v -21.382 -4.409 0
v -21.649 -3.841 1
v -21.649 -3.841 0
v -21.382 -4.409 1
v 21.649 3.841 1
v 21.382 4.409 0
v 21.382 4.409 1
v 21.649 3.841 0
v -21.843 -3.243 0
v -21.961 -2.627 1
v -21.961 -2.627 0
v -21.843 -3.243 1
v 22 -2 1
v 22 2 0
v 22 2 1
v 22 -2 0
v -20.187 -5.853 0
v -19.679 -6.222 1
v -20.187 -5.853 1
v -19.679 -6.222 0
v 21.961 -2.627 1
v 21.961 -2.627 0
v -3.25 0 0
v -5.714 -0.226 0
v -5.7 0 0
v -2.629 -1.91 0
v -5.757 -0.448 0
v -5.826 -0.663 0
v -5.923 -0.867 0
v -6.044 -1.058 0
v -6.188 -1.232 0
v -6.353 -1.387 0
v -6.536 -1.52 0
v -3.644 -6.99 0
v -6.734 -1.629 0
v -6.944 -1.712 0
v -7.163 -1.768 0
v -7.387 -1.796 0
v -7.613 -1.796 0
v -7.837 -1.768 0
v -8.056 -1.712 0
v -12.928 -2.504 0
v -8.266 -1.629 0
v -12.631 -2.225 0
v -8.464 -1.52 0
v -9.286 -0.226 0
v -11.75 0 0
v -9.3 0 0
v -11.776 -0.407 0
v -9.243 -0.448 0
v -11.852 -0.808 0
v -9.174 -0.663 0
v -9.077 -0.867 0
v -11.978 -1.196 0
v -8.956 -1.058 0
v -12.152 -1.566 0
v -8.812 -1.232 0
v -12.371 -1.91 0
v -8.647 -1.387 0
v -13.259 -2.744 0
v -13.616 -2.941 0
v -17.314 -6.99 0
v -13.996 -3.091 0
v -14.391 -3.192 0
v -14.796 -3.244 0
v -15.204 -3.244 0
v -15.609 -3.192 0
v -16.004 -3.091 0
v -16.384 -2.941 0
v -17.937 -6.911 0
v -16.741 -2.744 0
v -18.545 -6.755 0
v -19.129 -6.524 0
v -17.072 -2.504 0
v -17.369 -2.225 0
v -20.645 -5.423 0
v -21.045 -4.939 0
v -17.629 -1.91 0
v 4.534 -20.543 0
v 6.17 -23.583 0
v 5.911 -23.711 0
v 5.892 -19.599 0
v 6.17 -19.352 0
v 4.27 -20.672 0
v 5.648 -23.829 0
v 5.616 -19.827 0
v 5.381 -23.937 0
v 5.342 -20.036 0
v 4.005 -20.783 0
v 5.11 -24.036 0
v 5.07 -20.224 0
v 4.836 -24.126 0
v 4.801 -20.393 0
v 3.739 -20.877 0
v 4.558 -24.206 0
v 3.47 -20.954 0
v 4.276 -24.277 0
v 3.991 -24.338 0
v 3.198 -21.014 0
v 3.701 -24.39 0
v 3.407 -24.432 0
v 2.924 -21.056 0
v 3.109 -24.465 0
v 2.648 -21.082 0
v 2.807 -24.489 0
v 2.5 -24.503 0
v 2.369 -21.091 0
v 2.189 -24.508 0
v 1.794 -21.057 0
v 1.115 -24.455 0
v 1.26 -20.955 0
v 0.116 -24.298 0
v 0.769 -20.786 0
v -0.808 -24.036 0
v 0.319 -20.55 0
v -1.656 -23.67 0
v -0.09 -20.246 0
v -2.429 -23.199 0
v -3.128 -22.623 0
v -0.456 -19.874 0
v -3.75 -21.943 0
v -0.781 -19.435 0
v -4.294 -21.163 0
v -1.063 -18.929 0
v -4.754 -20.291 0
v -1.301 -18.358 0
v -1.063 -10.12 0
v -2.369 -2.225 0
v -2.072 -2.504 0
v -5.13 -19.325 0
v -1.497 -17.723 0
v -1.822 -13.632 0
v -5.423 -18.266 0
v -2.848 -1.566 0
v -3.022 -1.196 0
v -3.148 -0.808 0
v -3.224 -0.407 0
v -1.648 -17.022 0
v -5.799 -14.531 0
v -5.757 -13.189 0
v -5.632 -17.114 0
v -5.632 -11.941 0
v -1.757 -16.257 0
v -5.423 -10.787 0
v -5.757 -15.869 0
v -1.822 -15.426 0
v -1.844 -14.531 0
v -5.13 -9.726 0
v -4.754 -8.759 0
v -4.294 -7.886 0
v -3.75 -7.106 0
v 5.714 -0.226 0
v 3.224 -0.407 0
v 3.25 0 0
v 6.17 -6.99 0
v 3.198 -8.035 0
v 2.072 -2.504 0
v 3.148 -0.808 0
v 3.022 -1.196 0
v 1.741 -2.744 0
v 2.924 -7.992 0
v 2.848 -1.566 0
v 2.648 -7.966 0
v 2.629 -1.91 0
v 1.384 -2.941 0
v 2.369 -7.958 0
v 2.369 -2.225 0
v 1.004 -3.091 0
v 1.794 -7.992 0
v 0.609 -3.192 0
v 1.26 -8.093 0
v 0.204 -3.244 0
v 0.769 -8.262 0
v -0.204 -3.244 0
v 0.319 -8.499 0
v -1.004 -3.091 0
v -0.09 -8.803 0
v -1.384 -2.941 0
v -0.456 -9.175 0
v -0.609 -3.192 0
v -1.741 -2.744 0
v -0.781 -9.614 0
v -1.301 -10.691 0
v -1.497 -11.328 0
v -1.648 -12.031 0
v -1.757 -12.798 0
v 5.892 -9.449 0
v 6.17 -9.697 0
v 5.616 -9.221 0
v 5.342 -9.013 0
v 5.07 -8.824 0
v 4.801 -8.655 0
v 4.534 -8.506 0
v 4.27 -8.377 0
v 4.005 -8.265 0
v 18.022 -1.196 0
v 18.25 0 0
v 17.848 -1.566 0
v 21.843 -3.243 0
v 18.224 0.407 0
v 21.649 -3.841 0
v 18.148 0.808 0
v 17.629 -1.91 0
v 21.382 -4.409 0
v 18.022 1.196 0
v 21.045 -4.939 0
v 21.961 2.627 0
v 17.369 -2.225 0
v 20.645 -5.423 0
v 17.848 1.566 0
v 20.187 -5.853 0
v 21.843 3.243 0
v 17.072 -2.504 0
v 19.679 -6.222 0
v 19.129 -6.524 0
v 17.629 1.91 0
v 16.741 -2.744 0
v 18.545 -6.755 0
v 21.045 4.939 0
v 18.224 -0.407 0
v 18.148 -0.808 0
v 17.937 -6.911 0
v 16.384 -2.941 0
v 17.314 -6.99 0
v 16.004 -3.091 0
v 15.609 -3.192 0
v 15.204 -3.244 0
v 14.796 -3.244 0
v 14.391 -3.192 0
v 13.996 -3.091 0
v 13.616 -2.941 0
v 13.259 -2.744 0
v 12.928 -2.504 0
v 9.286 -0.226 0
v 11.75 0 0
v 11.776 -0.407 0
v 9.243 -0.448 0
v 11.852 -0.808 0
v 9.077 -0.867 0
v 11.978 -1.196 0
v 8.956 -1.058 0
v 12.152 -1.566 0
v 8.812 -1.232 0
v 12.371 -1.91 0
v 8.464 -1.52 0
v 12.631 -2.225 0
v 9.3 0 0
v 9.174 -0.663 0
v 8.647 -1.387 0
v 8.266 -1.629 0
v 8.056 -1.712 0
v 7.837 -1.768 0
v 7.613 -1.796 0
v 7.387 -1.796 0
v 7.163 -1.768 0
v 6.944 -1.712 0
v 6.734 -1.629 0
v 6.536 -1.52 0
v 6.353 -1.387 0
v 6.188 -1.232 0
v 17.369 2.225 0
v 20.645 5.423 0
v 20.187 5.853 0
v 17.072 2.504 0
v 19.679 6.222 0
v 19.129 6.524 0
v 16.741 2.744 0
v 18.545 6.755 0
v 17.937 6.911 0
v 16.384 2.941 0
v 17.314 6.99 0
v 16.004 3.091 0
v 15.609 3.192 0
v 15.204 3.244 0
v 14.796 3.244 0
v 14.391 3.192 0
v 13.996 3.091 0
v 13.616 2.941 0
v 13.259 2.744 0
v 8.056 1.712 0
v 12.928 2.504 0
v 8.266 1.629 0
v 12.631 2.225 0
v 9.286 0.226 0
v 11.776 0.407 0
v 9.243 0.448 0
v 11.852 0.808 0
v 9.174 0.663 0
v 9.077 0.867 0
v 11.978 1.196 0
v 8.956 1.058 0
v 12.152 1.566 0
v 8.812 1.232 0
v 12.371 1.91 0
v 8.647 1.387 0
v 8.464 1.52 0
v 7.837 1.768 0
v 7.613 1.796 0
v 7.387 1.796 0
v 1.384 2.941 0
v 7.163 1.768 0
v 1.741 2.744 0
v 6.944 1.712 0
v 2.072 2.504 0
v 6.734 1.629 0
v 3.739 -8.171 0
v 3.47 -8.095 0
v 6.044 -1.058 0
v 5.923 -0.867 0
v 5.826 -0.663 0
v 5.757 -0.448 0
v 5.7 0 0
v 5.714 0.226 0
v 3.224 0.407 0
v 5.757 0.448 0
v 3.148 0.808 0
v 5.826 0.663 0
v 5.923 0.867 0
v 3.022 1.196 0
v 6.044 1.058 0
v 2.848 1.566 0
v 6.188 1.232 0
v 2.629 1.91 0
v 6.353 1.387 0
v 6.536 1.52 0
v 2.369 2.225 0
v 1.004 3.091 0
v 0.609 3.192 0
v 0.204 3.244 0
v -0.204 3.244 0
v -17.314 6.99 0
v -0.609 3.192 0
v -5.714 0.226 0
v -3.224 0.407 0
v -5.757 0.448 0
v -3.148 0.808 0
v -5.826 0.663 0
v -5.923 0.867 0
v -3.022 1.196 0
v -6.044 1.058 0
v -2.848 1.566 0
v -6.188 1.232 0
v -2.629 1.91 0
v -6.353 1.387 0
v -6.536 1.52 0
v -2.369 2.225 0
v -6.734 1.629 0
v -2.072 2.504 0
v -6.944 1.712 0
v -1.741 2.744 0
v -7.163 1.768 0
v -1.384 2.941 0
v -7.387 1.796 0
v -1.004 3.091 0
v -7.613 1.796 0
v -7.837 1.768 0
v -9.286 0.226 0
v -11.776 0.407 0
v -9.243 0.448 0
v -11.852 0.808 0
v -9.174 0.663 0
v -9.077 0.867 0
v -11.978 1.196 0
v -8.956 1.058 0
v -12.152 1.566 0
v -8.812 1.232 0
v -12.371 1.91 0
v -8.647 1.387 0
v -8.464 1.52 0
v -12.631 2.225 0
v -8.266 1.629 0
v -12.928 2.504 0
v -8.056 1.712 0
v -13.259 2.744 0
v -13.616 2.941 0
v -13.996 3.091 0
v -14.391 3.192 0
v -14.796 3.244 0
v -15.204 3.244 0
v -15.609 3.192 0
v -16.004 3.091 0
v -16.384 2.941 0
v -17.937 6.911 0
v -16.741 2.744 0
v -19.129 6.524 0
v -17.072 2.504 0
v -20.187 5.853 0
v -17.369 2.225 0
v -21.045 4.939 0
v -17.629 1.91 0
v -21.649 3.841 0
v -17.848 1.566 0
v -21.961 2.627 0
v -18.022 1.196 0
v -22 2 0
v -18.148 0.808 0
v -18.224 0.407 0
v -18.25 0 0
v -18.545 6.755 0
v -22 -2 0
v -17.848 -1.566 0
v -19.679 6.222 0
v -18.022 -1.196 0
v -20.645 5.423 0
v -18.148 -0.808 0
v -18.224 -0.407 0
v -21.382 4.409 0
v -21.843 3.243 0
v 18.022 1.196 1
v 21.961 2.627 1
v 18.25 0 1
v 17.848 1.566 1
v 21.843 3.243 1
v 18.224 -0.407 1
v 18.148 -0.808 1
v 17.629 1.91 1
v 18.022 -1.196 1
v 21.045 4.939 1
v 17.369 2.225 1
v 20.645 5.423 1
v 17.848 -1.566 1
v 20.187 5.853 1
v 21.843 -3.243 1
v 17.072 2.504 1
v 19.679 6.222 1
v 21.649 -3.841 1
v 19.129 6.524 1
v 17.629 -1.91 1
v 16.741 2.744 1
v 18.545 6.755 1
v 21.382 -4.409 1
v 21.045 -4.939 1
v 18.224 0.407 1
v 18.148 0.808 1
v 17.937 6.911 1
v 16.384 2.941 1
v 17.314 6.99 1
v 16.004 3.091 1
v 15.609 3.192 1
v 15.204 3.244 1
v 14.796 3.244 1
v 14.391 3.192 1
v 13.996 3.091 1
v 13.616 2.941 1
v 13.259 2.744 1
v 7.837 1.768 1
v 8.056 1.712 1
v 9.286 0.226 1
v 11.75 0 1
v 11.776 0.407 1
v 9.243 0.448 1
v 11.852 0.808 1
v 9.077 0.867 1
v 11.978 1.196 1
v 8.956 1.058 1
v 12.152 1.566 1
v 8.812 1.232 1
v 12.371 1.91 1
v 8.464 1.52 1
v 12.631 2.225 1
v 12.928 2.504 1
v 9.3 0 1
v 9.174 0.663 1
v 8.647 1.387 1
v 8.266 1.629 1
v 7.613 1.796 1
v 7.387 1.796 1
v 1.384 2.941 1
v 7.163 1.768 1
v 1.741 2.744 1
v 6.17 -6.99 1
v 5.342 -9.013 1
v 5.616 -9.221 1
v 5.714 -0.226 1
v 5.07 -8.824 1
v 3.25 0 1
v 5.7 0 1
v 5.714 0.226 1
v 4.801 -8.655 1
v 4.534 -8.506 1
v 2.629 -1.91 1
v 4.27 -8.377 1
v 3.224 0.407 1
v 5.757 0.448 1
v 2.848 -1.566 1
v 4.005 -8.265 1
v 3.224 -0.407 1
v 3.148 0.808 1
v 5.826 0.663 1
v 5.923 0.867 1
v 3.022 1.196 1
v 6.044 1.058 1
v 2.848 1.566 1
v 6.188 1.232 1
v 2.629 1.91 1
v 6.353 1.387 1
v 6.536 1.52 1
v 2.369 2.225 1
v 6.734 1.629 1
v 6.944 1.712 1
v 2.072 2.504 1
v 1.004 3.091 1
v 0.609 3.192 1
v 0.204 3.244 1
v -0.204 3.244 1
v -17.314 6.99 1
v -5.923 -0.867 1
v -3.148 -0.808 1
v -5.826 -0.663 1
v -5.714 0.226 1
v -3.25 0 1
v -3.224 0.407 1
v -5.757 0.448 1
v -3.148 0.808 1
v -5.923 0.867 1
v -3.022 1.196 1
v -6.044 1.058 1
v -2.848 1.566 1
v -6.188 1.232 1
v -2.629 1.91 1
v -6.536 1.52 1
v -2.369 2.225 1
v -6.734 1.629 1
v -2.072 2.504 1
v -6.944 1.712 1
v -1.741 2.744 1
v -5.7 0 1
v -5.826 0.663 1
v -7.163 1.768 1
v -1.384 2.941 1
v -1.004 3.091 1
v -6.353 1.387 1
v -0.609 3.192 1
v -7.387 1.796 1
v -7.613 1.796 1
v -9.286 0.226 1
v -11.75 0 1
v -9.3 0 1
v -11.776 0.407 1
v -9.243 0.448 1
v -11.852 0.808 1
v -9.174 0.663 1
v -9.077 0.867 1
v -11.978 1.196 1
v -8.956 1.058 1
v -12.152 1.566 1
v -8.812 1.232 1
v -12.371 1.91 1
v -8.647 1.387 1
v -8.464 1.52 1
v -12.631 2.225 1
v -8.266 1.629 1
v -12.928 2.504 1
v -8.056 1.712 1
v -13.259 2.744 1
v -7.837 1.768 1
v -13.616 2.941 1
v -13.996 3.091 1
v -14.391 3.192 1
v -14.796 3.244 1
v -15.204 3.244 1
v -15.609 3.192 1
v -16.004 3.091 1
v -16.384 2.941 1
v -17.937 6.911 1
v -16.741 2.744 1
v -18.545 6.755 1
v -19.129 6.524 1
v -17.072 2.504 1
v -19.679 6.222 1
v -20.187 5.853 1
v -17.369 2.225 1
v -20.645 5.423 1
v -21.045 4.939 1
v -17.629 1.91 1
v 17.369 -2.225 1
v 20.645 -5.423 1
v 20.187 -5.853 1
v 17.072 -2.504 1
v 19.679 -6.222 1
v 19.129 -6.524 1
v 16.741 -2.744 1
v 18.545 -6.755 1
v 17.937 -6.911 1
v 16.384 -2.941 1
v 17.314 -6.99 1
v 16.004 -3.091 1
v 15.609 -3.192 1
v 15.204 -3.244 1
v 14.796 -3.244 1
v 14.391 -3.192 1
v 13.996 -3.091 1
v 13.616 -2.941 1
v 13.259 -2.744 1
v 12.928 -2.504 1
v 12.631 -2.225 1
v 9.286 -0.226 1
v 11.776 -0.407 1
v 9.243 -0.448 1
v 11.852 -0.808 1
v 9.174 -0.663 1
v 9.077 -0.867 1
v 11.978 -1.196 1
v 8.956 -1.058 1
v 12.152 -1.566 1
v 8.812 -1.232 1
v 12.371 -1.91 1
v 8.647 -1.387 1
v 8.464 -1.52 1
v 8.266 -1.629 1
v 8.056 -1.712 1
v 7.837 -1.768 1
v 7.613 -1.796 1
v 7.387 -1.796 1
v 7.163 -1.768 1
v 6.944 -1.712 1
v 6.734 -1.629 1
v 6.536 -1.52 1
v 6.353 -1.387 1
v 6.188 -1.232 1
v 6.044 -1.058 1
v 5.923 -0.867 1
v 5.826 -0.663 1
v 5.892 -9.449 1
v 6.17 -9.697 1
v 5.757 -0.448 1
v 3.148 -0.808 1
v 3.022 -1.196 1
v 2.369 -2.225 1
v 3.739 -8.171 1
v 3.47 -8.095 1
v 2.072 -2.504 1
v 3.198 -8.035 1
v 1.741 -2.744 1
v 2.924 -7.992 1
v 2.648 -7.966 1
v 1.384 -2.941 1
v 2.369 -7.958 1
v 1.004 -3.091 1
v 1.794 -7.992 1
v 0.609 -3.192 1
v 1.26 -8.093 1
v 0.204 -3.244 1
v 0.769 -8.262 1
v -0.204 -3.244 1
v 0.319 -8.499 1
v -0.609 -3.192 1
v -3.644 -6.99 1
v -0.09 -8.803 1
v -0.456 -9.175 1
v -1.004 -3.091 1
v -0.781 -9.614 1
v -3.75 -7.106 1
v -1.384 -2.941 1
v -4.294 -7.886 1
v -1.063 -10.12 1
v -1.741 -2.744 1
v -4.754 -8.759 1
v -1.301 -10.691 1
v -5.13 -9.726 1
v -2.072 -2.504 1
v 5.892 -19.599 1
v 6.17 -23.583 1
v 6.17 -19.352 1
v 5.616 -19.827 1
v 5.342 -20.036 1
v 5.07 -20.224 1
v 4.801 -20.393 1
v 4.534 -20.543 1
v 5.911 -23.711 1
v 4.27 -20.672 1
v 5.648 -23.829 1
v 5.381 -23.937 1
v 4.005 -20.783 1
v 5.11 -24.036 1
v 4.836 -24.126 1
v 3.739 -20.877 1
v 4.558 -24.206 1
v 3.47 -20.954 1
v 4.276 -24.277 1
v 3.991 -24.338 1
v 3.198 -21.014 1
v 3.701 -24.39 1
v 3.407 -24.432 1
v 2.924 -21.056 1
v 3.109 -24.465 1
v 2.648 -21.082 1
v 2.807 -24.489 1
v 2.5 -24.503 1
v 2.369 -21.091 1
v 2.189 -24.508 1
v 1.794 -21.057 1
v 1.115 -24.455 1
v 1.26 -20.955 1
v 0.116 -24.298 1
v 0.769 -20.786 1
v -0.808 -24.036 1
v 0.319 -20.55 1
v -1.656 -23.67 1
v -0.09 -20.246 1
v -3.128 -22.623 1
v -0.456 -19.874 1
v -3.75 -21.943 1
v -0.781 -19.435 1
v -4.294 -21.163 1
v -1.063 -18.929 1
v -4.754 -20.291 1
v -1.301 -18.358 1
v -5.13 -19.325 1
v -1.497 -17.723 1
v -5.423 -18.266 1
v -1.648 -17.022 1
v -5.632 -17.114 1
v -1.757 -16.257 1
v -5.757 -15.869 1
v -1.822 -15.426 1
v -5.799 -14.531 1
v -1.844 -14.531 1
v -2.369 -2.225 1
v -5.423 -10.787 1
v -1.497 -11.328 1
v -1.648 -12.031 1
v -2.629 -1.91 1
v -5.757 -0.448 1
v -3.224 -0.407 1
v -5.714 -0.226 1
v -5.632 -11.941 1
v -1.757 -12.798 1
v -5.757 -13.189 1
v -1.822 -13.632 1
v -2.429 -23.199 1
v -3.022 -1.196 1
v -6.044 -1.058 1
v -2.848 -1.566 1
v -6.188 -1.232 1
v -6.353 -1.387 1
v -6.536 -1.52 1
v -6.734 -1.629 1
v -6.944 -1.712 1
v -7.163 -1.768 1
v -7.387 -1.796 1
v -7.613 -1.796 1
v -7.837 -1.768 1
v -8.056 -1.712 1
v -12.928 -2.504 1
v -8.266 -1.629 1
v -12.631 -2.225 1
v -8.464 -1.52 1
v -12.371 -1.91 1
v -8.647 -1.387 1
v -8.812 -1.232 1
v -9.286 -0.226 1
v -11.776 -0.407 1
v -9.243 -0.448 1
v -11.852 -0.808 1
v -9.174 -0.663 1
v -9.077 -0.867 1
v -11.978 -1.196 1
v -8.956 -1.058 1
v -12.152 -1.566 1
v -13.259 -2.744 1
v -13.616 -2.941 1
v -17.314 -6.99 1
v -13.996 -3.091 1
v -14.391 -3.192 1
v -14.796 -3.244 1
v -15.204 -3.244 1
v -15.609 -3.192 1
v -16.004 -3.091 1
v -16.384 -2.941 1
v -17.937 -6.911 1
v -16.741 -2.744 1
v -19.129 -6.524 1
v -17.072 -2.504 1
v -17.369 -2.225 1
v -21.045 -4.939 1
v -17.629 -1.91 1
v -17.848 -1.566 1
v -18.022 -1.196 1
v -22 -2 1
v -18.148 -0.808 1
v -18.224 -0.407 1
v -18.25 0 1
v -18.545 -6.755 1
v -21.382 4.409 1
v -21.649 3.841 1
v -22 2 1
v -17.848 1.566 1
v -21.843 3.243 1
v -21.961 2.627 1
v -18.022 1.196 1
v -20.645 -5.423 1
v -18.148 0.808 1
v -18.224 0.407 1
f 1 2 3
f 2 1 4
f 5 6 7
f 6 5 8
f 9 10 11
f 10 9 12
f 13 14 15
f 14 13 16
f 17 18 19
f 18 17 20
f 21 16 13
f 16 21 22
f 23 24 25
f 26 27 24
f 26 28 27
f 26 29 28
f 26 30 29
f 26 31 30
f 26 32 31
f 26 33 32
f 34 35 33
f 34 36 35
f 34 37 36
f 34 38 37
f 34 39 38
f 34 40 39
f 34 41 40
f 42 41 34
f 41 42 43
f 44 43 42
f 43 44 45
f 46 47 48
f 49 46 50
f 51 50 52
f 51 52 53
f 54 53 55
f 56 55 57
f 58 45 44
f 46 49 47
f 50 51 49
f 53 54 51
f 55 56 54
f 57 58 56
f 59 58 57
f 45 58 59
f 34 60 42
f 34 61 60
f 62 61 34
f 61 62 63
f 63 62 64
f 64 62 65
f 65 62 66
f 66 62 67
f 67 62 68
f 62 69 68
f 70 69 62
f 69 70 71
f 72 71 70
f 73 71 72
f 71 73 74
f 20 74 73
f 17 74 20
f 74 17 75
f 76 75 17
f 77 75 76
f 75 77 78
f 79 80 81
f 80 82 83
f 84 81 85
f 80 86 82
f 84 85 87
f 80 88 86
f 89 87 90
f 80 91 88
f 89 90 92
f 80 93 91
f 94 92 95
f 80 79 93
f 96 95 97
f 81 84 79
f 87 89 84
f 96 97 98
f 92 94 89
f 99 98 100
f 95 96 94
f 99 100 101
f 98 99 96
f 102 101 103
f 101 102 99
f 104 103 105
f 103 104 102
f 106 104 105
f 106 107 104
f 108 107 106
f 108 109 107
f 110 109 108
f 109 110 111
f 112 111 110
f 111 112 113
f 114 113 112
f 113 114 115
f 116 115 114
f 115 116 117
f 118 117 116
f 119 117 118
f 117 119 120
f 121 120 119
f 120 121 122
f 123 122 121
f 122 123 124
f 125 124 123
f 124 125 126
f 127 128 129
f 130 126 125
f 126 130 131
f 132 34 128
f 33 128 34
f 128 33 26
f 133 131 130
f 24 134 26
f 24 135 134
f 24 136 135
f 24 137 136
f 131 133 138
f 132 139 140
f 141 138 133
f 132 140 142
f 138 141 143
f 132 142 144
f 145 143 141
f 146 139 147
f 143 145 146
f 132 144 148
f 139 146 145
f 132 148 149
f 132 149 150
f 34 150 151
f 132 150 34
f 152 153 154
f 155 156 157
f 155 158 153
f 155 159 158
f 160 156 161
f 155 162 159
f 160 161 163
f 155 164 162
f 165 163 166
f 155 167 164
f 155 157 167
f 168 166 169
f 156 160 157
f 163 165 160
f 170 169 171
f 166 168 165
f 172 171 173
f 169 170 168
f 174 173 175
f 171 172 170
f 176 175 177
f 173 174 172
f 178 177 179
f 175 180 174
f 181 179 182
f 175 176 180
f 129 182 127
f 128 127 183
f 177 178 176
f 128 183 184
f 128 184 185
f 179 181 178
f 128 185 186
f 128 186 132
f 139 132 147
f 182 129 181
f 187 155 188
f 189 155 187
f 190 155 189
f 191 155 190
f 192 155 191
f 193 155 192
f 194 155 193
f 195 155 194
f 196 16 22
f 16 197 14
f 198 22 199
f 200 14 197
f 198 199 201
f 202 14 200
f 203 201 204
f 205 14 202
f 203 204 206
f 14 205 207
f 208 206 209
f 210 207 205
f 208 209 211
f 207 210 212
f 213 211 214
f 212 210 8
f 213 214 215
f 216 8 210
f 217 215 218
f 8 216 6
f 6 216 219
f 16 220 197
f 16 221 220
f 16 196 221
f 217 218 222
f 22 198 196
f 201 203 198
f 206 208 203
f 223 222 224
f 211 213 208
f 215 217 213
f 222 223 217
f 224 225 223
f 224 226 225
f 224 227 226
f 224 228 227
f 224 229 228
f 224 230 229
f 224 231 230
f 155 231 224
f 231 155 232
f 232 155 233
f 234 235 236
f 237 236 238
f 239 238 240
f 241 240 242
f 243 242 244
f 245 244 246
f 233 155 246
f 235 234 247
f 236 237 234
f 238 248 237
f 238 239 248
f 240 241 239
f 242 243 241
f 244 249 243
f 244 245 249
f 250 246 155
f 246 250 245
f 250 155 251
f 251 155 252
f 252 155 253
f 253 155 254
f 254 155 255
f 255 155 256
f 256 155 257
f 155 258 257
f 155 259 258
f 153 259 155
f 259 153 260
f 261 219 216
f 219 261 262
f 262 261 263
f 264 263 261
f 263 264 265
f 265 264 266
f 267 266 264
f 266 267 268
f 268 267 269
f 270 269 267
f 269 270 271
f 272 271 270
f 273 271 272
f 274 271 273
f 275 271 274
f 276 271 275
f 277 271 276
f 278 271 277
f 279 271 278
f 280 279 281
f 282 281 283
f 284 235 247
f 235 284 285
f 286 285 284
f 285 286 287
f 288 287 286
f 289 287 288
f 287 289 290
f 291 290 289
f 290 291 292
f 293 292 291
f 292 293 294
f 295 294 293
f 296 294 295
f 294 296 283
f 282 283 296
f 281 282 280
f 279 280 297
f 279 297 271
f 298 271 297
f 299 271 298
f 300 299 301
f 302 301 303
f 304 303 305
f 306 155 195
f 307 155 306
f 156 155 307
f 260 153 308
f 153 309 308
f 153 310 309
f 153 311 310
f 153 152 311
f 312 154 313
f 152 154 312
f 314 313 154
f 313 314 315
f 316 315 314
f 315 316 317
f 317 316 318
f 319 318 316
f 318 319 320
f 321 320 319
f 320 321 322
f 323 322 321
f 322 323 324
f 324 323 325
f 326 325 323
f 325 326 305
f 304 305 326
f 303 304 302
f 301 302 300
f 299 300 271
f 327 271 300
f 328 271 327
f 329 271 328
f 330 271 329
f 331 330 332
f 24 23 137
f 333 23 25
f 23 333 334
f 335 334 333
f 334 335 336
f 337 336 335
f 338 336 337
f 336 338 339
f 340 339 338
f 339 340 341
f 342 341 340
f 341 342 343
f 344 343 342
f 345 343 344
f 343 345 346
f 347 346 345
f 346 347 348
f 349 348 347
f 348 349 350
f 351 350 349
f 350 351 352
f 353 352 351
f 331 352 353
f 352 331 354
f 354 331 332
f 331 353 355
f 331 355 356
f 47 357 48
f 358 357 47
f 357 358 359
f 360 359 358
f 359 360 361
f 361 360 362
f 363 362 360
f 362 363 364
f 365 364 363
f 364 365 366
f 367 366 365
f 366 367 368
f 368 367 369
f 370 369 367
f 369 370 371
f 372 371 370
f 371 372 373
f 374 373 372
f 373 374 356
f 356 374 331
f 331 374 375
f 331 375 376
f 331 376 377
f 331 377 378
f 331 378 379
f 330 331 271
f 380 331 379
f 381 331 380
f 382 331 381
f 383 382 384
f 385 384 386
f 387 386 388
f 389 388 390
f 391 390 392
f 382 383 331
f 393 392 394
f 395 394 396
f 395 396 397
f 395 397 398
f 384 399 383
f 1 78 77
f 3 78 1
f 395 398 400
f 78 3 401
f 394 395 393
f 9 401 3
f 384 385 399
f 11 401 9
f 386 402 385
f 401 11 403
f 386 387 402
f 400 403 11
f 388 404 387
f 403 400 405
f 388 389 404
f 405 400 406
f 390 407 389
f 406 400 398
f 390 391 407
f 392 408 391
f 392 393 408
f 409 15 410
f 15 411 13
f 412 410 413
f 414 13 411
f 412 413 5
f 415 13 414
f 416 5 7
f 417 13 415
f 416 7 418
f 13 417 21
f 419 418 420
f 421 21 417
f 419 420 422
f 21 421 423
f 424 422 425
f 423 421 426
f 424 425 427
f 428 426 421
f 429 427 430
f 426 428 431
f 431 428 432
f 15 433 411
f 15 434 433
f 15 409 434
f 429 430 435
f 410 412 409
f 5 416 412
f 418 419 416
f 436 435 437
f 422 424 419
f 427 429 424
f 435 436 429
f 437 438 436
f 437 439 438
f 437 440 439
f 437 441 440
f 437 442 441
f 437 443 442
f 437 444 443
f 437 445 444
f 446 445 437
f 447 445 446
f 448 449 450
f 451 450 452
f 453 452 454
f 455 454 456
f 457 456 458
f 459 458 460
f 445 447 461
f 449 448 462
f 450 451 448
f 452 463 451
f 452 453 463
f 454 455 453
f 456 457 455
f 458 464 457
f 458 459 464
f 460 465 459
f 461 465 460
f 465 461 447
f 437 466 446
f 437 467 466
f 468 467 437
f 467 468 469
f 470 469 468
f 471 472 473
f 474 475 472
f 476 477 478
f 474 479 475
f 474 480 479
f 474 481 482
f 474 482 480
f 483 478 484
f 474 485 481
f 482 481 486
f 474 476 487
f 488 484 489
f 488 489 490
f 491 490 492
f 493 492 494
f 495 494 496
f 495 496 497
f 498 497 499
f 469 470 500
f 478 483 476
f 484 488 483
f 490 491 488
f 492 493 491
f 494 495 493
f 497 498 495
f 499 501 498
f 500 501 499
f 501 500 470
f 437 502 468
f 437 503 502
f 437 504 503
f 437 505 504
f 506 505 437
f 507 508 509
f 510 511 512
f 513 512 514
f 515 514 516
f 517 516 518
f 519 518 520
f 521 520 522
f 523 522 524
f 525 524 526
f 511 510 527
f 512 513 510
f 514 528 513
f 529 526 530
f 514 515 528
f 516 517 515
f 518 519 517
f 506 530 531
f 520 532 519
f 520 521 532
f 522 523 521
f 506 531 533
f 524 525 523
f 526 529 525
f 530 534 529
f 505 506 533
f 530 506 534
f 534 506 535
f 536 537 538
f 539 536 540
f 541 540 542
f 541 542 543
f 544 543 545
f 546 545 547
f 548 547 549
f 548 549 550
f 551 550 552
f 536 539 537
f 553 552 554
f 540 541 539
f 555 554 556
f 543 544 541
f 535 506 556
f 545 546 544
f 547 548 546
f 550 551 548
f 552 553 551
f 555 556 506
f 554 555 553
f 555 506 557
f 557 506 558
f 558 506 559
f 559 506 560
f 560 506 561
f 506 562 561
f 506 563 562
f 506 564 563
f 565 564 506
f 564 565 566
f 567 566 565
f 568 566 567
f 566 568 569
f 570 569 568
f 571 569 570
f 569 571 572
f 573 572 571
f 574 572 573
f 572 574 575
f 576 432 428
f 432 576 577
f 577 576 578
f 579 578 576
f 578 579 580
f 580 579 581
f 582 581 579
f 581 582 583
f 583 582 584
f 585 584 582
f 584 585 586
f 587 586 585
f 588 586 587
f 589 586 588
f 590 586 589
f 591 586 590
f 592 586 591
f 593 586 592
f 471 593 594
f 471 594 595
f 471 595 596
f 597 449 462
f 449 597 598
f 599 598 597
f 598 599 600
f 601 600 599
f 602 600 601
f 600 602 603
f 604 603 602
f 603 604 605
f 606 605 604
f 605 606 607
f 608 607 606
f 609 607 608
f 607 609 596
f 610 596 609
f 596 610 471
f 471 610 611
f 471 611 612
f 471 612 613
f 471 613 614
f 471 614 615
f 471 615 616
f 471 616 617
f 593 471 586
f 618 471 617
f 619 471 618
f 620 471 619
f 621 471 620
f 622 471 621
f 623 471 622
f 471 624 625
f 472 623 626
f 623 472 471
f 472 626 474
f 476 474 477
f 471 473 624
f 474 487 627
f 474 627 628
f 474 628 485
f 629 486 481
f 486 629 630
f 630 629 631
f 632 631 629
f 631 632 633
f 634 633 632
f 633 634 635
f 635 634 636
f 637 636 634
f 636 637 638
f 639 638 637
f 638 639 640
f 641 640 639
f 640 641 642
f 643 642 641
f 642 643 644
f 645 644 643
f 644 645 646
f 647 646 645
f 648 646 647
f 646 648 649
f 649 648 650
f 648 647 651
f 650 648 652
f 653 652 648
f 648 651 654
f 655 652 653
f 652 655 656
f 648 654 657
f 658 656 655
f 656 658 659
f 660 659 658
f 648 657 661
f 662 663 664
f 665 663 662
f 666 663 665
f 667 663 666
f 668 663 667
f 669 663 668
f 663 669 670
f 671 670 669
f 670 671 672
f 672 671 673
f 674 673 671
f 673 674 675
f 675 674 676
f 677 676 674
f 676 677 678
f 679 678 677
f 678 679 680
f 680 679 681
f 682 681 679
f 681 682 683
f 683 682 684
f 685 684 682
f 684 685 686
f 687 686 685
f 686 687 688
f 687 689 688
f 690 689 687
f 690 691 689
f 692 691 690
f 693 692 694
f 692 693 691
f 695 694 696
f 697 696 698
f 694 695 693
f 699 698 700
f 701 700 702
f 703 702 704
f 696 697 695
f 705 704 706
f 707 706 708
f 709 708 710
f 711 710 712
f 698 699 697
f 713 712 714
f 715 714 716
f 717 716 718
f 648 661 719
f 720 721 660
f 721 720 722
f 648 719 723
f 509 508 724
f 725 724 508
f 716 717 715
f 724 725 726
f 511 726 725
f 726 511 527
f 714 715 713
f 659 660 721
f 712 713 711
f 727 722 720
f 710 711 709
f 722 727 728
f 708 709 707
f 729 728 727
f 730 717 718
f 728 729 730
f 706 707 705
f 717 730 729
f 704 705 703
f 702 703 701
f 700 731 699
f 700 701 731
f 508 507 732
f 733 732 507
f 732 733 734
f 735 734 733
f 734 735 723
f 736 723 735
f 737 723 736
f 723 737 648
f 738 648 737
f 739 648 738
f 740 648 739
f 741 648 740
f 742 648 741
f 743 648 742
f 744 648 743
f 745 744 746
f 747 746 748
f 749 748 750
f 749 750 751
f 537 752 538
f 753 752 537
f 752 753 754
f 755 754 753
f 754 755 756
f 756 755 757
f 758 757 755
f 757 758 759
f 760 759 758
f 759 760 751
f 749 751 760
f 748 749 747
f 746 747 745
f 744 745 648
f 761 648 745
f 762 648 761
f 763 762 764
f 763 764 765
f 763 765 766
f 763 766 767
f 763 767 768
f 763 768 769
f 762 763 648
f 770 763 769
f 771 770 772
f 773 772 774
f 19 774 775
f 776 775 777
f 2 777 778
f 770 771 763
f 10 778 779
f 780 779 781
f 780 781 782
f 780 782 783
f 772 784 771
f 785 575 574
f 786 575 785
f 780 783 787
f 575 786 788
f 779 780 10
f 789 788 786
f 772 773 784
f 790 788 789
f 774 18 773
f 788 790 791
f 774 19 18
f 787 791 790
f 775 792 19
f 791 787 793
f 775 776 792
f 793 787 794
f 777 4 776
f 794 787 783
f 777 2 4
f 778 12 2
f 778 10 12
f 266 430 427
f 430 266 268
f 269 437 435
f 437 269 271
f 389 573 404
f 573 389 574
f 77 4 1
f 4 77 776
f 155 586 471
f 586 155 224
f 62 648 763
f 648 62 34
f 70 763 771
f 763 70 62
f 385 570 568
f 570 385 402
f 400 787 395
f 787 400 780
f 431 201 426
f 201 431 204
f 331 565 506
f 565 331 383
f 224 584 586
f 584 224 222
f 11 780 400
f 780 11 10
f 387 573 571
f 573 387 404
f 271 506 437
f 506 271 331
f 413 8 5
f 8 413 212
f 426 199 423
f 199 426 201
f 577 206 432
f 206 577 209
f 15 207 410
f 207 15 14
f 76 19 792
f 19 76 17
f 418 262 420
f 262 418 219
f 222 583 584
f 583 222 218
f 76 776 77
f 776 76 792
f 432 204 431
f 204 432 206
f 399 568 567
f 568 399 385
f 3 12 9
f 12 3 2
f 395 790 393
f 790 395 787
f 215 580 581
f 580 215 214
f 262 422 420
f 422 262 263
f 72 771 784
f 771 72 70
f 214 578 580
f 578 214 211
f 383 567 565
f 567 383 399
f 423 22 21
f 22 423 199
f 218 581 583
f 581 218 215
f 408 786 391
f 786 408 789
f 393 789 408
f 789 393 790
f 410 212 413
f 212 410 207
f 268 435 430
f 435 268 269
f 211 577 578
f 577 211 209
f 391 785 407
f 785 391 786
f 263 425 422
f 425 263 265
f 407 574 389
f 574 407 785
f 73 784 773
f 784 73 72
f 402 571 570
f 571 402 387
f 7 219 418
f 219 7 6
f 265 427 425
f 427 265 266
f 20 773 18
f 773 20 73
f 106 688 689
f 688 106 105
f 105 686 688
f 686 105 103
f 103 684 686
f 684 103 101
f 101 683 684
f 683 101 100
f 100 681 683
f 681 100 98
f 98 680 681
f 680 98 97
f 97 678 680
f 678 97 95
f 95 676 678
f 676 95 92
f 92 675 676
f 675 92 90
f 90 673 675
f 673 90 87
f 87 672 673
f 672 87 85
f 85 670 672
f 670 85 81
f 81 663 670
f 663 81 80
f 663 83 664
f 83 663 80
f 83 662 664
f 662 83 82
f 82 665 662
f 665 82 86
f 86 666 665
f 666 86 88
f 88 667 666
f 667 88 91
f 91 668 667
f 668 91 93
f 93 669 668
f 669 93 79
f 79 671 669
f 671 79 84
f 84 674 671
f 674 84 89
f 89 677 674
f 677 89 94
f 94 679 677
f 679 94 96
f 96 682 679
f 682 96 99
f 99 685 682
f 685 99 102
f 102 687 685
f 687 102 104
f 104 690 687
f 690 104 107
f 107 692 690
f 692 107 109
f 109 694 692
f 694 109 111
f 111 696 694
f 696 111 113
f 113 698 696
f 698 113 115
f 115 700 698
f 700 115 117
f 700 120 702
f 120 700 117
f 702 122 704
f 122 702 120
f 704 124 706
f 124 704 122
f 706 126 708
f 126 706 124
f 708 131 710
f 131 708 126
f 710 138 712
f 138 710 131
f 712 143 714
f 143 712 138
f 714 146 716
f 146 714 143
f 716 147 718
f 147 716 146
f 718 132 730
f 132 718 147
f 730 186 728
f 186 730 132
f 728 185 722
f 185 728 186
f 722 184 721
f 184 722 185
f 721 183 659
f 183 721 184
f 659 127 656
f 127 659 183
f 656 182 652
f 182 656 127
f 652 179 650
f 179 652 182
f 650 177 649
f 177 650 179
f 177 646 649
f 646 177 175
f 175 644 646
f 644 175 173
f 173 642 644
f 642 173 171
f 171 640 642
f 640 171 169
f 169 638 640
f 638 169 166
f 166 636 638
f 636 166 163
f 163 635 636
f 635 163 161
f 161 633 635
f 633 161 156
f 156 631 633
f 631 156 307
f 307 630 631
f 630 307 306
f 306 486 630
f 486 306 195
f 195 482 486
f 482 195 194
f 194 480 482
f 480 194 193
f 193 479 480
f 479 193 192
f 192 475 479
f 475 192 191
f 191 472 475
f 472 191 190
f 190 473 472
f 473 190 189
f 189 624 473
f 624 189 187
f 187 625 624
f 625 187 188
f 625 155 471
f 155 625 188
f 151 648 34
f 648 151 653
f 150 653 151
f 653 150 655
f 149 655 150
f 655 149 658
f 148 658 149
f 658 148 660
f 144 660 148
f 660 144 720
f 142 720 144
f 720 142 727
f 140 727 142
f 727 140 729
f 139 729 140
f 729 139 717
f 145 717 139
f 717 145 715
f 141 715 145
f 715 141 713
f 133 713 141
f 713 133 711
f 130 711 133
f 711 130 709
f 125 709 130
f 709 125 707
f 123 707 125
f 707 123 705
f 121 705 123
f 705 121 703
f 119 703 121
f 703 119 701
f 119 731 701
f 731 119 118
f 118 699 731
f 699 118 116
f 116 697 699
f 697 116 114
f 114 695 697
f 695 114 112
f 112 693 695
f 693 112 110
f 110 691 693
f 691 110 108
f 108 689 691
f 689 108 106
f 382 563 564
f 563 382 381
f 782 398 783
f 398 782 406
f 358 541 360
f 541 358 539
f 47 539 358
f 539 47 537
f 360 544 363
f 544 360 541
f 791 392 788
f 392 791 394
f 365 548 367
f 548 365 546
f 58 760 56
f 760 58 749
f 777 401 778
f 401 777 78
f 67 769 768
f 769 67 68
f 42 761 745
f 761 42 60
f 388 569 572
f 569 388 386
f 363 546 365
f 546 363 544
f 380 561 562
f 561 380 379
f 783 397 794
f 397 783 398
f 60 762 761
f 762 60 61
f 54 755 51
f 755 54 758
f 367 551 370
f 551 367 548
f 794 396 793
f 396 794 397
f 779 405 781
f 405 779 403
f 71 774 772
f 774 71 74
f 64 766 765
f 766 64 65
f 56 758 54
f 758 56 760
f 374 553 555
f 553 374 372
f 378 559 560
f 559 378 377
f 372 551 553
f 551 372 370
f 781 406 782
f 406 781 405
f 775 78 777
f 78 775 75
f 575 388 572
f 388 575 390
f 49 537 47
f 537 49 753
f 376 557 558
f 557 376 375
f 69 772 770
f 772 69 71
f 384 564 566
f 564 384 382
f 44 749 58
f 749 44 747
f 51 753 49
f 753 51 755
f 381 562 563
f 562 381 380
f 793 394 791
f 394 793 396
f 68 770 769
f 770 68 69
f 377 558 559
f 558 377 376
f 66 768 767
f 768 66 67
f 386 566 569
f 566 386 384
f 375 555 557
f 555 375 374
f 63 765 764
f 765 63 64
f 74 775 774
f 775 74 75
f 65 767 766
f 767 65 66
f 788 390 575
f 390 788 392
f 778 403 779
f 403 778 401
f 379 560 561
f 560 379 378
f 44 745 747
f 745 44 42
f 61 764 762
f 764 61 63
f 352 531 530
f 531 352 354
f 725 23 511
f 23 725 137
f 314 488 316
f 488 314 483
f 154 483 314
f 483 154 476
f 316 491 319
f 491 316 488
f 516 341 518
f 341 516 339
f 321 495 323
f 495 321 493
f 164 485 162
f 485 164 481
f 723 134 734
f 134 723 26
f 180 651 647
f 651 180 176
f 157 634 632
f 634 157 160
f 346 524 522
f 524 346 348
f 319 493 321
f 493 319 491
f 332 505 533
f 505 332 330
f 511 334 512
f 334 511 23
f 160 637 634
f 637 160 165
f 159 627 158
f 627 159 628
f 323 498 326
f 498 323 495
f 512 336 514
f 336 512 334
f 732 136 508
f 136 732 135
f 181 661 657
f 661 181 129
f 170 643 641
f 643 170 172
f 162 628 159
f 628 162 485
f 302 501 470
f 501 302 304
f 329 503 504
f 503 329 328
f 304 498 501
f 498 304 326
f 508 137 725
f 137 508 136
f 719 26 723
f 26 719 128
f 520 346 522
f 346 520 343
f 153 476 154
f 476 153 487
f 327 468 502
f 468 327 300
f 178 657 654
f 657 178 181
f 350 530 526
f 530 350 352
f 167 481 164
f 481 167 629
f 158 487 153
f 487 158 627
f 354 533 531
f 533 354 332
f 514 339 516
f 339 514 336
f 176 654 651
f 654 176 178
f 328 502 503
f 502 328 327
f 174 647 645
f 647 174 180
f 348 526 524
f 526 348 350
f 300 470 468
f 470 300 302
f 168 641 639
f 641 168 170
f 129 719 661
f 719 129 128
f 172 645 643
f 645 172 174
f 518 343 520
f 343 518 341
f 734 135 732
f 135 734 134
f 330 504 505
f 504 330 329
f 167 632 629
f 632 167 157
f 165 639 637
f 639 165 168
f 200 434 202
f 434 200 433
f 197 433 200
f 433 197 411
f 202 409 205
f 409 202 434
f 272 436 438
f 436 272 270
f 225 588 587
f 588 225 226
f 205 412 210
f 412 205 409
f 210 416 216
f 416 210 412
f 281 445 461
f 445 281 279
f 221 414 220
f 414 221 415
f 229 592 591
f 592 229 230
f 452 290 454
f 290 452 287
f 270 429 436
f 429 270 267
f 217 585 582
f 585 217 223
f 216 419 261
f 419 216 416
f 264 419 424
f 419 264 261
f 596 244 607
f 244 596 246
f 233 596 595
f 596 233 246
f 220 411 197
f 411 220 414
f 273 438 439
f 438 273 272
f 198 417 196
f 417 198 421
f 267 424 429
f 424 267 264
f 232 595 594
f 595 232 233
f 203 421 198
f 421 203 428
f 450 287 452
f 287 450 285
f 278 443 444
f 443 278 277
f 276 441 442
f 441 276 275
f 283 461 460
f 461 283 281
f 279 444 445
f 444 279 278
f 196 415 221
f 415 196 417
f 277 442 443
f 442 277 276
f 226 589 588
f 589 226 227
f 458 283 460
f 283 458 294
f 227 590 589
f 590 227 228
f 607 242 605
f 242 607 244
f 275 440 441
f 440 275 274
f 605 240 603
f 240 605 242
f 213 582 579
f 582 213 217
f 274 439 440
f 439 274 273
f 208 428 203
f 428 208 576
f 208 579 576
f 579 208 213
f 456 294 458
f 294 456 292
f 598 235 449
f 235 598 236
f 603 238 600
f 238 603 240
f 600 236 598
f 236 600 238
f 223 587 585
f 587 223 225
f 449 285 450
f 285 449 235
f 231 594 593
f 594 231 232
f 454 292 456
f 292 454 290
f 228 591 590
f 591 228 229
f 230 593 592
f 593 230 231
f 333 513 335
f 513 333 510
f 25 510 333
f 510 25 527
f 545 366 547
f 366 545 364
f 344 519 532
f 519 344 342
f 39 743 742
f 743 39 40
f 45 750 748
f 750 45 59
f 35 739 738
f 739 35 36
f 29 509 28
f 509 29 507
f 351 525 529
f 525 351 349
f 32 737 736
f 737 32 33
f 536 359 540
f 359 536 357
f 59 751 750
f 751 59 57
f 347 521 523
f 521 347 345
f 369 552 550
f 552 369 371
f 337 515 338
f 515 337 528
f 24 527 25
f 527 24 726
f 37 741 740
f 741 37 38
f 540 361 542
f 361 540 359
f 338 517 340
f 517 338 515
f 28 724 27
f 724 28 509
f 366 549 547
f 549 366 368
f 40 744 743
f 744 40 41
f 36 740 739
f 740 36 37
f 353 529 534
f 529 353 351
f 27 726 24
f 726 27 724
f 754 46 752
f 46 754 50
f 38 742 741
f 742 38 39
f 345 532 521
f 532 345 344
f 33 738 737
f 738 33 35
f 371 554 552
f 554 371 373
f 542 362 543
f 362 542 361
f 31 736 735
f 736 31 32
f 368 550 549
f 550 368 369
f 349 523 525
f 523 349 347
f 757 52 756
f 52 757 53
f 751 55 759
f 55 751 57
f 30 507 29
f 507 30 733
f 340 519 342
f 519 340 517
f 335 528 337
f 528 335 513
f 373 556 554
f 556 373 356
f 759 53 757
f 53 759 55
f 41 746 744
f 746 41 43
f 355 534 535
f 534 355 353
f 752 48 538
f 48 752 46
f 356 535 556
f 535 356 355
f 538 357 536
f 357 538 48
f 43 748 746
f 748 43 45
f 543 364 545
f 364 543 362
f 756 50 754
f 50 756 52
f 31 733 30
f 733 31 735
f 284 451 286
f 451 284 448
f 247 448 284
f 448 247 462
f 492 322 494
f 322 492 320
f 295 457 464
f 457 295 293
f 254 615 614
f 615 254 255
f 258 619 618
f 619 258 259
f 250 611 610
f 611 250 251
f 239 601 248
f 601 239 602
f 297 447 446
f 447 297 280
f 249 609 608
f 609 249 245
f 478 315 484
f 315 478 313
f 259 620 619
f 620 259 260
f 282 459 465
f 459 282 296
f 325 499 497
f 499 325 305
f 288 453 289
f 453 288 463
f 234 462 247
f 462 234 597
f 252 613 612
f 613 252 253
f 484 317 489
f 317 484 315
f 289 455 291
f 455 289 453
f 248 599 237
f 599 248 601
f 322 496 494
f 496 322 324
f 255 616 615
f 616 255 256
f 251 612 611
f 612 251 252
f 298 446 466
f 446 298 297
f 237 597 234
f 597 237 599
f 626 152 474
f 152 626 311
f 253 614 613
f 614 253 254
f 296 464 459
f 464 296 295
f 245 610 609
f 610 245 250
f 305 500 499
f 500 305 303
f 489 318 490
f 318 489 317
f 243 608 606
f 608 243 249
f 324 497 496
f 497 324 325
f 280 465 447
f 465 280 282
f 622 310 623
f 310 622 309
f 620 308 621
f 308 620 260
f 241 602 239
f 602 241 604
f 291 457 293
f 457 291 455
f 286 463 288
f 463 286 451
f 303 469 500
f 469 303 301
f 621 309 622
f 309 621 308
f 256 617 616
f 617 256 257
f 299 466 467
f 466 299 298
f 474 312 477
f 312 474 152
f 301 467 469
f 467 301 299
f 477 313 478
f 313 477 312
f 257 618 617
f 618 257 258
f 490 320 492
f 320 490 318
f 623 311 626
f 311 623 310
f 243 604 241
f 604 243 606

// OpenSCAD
$fn = 50;


difference() {
	union() {
		hull() {
			translate(v = [-17.0000000000, 2.0000000000, 0]) {
				cylinder(h = 1, r = 5);
			}
			translate(v = [17.0000000000, 2.0000000000, 0]) {
				cylinder(h = 1, r = 5);
			}
			translate(v = [-17.0000000000, -2.0000000000, 0]) {
				cylinder(h = 1, r = 5);
			}
			translate(v = [17.0000000000, -2.0000000000, 0]) {
				cylinder(h = 1, r = 5);
			}
		}
		translate(v = [0, -5, 0]) {
			linear_extrude(height = 1) {
				text(font = "DejaVu Sans Mono:style=Bold", halign = "center", size = 19.0000000000, text = "C", valign = "top");
			}
		}
	}
	union() {
		translate(v = [-15.0000000000, 0.0000000000, 0]) {
			translate(v = [0, 0, -100]) {
				cylinder(h = 200, r = 3.2500000000);
			}
		}
		translate(v = [0, 0, -100]) {
			cylinder(h = 200, r = 3.2500000000);
		}
		translate(v = [15.0000000000, 0.0000000000, 0]) {
			translate(v = [0, 0, -100]) {
				cylinder(h = 200, r = 3.2500000000);
			}
		}
		translate(v = [-15.0000000000, 0.0000000000, 0]) {
			translate(v = [0, 0, -100]) {
				cylinder(h = 200, r = 1.8000000000);
			}
		}
		translate(v = [-7.5000000000, 0.0000000000, 0]) {
			translate(v = [0, 0, -100]) {
				cylinder(h = 200, r = 1.8000000000);
			}
		}
		translate(v = [0, 0, -100]) {
			cylinder(h = 200, r = 1.8000000000);
		}
		translate(v = [7.5000000000, 0.0000000000, 0]) {
			translate(v = [0, 0, -100]) {
				cylinder(h = 200, r = 1.8000000000);
			}
		}
		translate(v = [15.0000000000, 0.0000000000, 0]) {
			translate(v = [0, 0, -100]) {
				cylinder(h = 200, r = 1.8000000000);
			}
		}
	}
}
